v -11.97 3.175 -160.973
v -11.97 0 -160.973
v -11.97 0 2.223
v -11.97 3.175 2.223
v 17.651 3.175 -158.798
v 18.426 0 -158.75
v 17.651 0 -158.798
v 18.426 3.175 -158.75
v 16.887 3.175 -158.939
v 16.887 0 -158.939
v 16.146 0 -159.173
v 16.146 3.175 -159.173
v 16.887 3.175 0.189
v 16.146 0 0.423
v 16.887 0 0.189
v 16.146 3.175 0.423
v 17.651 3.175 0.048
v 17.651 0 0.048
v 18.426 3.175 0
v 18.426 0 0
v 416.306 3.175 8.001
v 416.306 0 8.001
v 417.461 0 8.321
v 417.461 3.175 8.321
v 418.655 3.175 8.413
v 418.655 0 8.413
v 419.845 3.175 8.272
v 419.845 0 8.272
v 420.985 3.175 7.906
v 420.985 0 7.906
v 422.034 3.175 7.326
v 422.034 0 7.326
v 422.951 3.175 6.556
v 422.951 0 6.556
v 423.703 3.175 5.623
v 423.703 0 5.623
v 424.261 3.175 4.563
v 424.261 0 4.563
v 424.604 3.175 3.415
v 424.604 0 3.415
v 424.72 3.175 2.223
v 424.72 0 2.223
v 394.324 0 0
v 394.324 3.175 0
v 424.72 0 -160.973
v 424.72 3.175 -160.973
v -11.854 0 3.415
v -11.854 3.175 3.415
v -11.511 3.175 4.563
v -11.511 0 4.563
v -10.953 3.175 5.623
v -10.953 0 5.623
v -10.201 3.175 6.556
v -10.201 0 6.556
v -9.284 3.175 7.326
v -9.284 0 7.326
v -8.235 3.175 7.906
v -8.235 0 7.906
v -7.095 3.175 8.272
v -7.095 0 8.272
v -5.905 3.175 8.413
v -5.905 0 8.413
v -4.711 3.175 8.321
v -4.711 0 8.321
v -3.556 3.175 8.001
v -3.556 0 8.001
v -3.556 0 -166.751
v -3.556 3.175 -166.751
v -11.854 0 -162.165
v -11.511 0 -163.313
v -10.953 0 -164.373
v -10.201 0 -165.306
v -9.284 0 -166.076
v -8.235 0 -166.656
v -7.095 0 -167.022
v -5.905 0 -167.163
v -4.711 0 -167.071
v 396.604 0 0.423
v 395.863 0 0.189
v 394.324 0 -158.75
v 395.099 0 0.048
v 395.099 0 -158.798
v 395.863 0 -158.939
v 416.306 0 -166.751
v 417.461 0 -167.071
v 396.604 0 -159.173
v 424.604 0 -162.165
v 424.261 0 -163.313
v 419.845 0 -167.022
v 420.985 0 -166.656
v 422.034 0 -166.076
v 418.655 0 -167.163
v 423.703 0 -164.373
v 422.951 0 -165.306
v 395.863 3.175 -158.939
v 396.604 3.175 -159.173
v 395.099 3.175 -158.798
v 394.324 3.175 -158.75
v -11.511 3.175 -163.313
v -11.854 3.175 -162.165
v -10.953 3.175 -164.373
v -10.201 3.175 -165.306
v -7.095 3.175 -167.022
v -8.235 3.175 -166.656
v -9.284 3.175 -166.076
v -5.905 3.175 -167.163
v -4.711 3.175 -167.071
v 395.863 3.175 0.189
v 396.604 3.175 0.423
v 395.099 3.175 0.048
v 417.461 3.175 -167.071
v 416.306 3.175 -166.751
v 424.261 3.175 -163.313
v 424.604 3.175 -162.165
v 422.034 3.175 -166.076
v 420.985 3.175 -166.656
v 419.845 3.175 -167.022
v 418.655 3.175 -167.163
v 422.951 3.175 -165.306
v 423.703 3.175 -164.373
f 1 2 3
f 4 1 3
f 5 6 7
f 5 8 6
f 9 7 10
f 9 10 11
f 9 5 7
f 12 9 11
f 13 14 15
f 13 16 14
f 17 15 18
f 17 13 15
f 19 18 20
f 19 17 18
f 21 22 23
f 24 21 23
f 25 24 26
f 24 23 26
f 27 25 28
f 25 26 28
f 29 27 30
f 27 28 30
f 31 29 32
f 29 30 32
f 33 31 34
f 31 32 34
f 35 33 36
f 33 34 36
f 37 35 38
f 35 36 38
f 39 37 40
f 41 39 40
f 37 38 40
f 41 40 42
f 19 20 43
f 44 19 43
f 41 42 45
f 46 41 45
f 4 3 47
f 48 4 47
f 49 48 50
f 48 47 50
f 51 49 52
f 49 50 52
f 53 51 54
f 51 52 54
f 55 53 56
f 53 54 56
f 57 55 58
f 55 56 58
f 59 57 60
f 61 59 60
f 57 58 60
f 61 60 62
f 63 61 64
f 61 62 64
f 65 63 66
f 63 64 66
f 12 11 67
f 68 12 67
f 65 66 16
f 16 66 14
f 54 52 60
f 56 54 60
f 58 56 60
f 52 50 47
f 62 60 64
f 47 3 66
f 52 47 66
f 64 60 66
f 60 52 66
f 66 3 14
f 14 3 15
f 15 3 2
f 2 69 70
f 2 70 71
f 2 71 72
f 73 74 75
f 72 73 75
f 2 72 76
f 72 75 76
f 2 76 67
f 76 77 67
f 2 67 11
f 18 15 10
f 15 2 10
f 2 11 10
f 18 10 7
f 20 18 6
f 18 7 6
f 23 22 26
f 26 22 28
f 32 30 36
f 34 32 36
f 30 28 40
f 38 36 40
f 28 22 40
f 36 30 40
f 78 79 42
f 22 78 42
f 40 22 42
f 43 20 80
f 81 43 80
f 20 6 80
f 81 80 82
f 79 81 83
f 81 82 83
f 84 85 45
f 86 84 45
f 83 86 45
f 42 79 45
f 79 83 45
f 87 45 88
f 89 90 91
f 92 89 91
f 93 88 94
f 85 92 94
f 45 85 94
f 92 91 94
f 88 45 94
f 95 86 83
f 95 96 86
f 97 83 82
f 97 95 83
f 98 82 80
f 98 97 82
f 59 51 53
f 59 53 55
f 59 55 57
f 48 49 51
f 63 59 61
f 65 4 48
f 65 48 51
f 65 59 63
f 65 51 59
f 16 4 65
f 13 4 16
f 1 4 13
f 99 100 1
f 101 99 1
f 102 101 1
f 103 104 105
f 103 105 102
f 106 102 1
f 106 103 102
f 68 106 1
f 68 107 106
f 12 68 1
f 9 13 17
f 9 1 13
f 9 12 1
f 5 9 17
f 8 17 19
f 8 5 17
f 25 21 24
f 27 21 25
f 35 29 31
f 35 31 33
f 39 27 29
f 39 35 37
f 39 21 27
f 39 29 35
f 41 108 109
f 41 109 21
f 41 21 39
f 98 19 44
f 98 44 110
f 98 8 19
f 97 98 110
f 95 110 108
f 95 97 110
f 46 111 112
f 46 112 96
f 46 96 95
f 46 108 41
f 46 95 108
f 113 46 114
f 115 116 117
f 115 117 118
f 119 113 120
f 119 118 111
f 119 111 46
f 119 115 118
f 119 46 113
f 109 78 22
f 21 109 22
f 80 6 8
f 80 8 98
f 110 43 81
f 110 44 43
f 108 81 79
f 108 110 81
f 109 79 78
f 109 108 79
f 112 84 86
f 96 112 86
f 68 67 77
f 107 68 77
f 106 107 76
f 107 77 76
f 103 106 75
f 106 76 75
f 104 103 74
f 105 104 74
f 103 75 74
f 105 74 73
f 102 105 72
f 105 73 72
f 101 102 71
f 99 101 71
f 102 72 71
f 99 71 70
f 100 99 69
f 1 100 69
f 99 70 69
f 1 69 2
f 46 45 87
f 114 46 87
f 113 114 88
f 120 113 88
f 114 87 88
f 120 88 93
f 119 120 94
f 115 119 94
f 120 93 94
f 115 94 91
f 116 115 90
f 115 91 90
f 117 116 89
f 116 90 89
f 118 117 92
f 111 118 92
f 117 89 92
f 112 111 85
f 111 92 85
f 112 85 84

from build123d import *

# Parameters (mm, degrees)
SKETCH1_W           = 412.75
SKETCH1_H           = 158.75
SKETCH1_R           = 6.191295591
BOSS_EXTRUDE1_DEPTH = 3.175
FILLET1_R           = 6.35


with BuildPart() as part:
    # Sketch1 → Boss-Extrude1 (new body)
    with BuildSketch(Plane(origin=(0, 0, 0), x_dir=(1, 0, 0), z_dir=(0, 1, 0))):
        with Locations((206.375, 79.375)):
            Rectangle(SKETCH1_W, SKETCH1_H)
        with Locations((418.528618537, 160.972545591)):
            Circle(SKETCH1_R)
        with BuildLine():
            Line((416.306072946, 166.751164128), (395.503046214, 158.75))
            Line((395.503046214, 158.75), (412.75, 158.75))
            ThreePointArc((412.75, 158.75), (412.870941125, 163.487068885), (416.306072946, 166.751164128))
        make_face()
        with BuildLine():
            Line((412.75, 158.75), (412.75, 0))
            ThreePointArc((412.75, 0), (419.658885237, 3.864706522), (424.719914128, -2.222545591))
            Line((424.719914128, -2.222545591), (424.719914128, 160.972545591))
            ThreePointArc((424.719914128, 160.972545591), (419.658885237, 154.885293478), (412.75, 158.75))
        make_face()
        with BuildLine():
            Line((412.75, 0), (395.503046214, 0))
            Line((395.503046214, 0), (416.306072946, -8.001164128))
            ThreePointArc((416.306072946, -8.001164128), (412.870941125, -4.737068885), (412.75, 0))
        make_face()
        with Locations((418.528618537, -2.222545591)):
            Circle(SKETCH1_R)
        with Locations((-5.778618537, 160.972545591)):
            Circle(SKETCH1_R)
        with BuildLine():
            ThreePointArc((0.412677054, 160.972545591), (0.308633576, 159.842278891), (0, 158.75))
            Line((0, 158.75), (17.246953786, 158.75))
            Line((17.246953786, 158.75), (-3.556072946, 166.751164128))
            ThreePointArc((-3.556072946, 166.751164128), (-0.675062041, 164.47766359), (0.412677054, 160.972545591))
        make_face()
        with BuildLine():
            ThreePointArc((-11.969914128, -2.222545591), (-6.908885237, 3.864706522), (0, 0))
            Line((0, 0), (0, 158.75))
            ThreePointArc((0, 158.75), (-6.908885237, 154.885293478), (-11.969914128, 160.972545591))
            Line((-11.969914128, 160.972545591), (-11.969914128, -2.222545591))
        make_face()
        with Locations((-5.778618537, -2.222545591)):
            Circle(SKETCH1_R)
        with BuildLine():
            Line((17.246953786, 0), (0, 0))
            ThreePointArc((0, 0), (0.308633576, -1.092278891), (0.412677054, -2.222545591))
            ThreePointArc((0.412677054, -2.222545591), (-0.675062041, -5.72766359), (-3.556072946, -8.001164128))
            Line((-3.556072946, -8.001164128), (17.246953786, 0))
        make_face()
    extrude(amount=BOSS_EXTRUDE1_DEPTH)

    # Fillet1
    fillet1_edges = [part.edges().sort_by_distance(p)[0] for p in [
        (17.246953786, 1.5875, -158.75),
        (395.503046214, 1.5875, -158.75),
        (395.503046214, 1.5875, 0),
        (17.246953786, 1.5875, 0),
    ]]
    fillet(fillet1_edges, radius=FILLET1_R)


solid = part.part
